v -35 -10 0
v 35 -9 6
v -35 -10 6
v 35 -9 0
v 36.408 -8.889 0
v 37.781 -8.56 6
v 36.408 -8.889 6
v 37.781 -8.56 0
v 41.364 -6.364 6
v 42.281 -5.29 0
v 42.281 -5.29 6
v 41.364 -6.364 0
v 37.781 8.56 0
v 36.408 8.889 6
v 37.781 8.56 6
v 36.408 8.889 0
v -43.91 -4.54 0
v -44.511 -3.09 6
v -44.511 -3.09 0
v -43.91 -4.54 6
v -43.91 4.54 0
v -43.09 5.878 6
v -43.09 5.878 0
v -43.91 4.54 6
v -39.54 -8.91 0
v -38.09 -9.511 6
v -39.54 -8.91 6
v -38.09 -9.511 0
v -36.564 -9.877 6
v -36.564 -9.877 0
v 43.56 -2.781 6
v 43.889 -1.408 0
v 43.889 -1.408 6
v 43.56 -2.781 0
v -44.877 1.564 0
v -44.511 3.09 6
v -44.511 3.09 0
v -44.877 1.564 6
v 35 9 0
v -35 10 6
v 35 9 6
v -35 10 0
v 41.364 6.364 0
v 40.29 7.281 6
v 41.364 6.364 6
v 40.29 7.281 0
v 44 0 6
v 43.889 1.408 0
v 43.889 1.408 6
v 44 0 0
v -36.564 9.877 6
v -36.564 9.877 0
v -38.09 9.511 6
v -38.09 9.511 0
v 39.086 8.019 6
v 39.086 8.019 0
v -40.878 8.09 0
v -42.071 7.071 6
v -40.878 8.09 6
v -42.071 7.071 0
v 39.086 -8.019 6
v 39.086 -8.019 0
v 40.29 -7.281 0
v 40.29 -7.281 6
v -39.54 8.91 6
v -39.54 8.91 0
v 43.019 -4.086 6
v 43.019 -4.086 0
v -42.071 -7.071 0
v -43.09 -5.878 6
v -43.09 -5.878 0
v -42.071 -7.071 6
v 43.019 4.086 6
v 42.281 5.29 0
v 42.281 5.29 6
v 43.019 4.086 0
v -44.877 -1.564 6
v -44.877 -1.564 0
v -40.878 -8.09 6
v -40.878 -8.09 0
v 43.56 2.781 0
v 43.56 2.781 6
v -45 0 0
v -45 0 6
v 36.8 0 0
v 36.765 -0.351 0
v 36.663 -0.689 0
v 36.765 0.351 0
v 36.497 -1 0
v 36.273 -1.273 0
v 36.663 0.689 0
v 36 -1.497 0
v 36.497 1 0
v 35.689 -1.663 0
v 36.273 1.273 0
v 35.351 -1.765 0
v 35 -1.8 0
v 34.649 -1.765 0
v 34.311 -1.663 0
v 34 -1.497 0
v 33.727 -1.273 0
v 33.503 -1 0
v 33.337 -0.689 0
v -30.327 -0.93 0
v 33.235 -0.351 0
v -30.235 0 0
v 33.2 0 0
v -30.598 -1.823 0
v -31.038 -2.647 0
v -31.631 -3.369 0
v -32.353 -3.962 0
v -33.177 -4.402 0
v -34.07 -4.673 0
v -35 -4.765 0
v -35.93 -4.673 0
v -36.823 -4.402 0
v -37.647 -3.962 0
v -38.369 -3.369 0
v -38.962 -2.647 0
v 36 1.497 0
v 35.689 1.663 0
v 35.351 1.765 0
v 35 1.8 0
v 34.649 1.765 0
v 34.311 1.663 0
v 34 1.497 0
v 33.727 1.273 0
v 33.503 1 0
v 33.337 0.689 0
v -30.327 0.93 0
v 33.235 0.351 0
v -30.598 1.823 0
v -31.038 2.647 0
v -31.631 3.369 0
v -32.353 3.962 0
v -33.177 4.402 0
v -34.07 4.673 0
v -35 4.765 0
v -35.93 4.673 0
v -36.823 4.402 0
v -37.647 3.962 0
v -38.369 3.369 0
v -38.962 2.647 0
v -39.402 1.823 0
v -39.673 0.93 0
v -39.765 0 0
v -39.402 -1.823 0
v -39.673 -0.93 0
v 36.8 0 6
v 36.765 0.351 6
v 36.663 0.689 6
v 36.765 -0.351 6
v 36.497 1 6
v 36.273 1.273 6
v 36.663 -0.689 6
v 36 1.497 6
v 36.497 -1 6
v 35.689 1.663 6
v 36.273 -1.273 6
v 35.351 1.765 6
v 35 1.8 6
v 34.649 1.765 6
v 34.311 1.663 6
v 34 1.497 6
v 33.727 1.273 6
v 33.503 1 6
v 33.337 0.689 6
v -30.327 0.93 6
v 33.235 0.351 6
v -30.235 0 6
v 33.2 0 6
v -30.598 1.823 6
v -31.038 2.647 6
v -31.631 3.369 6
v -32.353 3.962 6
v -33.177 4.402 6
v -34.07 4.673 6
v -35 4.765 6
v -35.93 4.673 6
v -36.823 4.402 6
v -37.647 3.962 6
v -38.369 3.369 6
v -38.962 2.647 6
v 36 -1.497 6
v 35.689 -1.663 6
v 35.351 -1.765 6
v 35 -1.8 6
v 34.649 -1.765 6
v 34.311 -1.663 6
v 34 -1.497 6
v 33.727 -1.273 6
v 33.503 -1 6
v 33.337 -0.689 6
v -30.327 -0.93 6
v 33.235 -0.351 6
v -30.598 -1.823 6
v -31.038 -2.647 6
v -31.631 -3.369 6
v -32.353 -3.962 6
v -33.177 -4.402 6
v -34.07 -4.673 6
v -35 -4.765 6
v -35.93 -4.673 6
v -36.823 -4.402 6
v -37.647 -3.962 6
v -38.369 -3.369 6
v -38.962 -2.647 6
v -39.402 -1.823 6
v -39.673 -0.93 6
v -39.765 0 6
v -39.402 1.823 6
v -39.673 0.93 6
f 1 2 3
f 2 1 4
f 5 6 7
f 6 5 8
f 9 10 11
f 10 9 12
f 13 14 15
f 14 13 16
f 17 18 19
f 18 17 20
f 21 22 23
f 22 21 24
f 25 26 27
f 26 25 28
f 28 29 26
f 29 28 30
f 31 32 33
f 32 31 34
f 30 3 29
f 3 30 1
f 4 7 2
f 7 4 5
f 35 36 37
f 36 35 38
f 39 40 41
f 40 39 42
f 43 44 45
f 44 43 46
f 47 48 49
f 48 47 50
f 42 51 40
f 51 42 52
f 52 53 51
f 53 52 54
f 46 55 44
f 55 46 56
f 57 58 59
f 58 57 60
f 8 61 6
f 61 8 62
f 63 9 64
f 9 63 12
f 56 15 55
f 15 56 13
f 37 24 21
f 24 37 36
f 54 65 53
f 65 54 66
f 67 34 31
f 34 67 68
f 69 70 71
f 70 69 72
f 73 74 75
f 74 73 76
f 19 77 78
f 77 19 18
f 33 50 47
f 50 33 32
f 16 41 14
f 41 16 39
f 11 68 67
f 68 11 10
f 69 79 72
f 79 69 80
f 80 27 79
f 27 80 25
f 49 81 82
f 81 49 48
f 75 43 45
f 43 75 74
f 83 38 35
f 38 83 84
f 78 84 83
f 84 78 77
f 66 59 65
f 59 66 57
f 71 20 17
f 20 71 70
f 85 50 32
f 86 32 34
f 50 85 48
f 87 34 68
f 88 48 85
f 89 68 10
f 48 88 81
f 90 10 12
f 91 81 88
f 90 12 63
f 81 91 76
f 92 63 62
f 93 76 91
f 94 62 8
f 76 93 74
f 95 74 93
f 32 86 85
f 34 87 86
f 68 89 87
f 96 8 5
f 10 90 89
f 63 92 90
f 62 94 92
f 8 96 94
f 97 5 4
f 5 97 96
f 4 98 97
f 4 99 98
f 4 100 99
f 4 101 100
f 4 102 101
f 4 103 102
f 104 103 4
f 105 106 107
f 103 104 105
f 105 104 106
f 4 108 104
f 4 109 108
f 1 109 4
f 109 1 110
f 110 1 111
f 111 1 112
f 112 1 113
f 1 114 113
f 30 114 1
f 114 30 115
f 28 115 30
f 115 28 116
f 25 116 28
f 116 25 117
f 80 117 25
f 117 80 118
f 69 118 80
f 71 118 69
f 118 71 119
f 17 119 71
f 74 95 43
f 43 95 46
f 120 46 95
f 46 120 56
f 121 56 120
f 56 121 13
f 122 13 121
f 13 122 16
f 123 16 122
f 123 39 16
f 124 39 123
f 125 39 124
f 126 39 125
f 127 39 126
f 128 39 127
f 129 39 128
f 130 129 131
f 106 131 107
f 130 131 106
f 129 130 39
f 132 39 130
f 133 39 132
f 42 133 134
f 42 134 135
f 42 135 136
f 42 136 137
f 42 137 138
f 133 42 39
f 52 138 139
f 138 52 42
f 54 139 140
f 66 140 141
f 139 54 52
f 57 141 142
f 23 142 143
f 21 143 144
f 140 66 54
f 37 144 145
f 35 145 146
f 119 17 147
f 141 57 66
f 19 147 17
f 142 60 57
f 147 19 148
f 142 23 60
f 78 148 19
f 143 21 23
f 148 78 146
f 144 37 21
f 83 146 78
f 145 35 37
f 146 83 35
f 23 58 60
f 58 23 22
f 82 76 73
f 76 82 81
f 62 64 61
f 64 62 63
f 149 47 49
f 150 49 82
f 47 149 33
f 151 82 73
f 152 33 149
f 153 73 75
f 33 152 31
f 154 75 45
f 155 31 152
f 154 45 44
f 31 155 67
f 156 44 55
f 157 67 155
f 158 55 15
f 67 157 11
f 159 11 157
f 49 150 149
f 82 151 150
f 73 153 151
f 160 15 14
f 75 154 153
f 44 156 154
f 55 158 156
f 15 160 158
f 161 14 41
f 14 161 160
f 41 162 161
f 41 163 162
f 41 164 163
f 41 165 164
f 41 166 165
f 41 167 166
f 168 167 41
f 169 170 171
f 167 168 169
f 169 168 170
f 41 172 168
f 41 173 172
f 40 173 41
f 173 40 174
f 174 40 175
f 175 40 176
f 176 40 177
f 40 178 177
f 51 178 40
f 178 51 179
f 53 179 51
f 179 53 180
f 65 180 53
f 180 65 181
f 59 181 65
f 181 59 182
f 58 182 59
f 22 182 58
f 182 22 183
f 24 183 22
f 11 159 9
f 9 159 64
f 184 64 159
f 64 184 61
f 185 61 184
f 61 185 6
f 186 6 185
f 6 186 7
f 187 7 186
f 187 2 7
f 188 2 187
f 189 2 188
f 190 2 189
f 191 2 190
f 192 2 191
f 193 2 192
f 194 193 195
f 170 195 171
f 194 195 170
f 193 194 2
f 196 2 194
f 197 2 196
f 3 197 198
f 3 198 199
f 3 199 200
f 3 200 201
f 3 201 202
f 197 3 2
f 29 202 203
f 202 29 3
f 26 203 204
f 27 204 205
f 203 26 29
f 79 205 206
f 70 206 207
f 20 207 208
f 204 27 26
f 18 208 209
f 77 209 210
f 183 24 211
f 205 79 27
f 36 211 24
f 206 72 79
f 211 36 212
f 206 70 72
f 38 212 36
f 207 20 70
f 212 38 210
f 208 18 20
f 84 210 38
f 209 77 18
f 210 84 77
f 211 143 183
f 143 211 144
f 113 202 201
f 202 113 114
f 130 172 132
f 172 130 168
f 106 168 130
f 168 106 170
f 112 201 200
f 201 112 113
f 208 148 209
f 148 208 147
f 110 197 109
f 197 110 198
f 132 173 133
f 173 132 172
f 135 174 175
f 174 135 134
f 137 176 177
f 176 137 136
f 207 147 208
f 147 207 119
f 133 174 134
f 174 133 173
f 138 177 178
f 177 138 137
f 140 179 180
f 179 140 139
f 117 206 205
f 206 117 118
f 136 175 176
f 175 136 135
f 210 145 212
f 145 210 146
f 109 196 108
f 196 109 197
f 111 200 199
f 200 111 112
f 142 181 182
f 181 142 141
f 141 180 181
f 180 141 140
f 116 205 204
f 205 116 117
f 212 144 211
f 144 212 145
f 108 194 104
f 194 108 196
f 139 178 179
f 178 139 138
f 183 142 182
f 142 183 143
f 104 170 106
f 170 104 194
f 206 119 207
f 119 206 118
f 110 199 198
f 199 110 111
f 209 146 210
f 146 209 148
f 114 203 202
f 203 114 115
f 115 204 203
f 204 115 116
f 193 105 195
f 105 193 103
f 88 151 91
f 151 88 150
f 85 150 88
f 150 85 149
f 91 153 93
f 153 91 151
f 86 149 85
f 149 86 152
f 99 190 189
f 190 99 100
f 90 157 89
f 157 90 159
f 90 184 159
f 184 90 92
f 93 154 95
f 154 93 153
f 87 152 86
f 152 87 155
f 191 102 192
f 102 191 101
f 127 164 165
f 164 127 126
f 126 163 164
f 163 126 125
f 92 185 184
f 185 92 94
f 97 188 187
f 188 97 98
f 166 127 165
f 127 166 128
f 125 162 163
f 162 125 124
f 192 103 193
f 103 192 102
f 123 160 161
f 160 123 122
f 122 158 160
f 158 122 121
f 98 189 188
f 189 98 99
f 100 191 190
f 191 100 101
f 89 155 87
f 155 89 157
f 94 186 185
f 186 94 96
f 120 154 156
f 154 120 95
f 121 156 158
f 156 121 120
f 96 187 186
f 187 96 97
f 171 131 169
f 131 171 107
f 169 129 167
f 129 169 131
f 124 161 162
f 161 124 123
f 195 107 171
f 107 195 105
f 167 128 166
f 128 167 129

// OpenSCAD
$fn = 32;

// ----------------------------------------------------------------------
// Lever: 70 mm between the bosses, 6 mm thick, smooth outline
// ----------------------------------------------------------------------

// --- parameters (mm) ---
lever_l = 70;             // distance between the boss centres
boss_a = 20;              // first boss diameter
boss_b = 18;              // second boss diameter
bore_a = 9.53;            // first bore
bore_b = 3.6;             // second bore
lever_t = 6;              // lever thickness

lever_profile = [[-45, 0], [-44.877, -1.564], [-44.511, -3.09], [-43.91, -4.54], [-43.09, -5.878], [-42.071, -7.071], [-40.878, -8.09], [-39.54, -8.91], [-38.09, -9.511], [-36.564, -9.877], [-35, -10], [35, -9], [36.408, -8.889], [37.781, -8.56], [39.086, -8.019], [40.29, -7.281], [41.364, -6.364], [42.281, -5.29], [43.019, -4.086], [43.56, -2.781], [43.889, -1.408], [44, 0], [43.889, 1.408], [43.56, 2.781], [43.019, 4.086], [42.281, 5.29], [41.364, 6.364], [40.29, 7.281], [39.086, 8.019], [37.781, 8.56], [36.408, 8.889], [35, 9], [-35, 10], [-36.564, 9.877], [-38.09, 9.511], [-39.54, 8.91], [-40.878, 8.09], [-42.071, 7.071], [-43.09, 5.878], [-43.91, 4.54], [-44.511, 3.09], [-44.877, 1.564]];

difference() {
  linear_extrude(height = lever_t) polygon(lever_profile);
  translate([-35, 0, -2.5]) cylinder(h = lever_t + 5, d = bore_a);
  translate([35, 0, -2.5]) cylinder(h = lever_t + 5, d = bore_b);
}
